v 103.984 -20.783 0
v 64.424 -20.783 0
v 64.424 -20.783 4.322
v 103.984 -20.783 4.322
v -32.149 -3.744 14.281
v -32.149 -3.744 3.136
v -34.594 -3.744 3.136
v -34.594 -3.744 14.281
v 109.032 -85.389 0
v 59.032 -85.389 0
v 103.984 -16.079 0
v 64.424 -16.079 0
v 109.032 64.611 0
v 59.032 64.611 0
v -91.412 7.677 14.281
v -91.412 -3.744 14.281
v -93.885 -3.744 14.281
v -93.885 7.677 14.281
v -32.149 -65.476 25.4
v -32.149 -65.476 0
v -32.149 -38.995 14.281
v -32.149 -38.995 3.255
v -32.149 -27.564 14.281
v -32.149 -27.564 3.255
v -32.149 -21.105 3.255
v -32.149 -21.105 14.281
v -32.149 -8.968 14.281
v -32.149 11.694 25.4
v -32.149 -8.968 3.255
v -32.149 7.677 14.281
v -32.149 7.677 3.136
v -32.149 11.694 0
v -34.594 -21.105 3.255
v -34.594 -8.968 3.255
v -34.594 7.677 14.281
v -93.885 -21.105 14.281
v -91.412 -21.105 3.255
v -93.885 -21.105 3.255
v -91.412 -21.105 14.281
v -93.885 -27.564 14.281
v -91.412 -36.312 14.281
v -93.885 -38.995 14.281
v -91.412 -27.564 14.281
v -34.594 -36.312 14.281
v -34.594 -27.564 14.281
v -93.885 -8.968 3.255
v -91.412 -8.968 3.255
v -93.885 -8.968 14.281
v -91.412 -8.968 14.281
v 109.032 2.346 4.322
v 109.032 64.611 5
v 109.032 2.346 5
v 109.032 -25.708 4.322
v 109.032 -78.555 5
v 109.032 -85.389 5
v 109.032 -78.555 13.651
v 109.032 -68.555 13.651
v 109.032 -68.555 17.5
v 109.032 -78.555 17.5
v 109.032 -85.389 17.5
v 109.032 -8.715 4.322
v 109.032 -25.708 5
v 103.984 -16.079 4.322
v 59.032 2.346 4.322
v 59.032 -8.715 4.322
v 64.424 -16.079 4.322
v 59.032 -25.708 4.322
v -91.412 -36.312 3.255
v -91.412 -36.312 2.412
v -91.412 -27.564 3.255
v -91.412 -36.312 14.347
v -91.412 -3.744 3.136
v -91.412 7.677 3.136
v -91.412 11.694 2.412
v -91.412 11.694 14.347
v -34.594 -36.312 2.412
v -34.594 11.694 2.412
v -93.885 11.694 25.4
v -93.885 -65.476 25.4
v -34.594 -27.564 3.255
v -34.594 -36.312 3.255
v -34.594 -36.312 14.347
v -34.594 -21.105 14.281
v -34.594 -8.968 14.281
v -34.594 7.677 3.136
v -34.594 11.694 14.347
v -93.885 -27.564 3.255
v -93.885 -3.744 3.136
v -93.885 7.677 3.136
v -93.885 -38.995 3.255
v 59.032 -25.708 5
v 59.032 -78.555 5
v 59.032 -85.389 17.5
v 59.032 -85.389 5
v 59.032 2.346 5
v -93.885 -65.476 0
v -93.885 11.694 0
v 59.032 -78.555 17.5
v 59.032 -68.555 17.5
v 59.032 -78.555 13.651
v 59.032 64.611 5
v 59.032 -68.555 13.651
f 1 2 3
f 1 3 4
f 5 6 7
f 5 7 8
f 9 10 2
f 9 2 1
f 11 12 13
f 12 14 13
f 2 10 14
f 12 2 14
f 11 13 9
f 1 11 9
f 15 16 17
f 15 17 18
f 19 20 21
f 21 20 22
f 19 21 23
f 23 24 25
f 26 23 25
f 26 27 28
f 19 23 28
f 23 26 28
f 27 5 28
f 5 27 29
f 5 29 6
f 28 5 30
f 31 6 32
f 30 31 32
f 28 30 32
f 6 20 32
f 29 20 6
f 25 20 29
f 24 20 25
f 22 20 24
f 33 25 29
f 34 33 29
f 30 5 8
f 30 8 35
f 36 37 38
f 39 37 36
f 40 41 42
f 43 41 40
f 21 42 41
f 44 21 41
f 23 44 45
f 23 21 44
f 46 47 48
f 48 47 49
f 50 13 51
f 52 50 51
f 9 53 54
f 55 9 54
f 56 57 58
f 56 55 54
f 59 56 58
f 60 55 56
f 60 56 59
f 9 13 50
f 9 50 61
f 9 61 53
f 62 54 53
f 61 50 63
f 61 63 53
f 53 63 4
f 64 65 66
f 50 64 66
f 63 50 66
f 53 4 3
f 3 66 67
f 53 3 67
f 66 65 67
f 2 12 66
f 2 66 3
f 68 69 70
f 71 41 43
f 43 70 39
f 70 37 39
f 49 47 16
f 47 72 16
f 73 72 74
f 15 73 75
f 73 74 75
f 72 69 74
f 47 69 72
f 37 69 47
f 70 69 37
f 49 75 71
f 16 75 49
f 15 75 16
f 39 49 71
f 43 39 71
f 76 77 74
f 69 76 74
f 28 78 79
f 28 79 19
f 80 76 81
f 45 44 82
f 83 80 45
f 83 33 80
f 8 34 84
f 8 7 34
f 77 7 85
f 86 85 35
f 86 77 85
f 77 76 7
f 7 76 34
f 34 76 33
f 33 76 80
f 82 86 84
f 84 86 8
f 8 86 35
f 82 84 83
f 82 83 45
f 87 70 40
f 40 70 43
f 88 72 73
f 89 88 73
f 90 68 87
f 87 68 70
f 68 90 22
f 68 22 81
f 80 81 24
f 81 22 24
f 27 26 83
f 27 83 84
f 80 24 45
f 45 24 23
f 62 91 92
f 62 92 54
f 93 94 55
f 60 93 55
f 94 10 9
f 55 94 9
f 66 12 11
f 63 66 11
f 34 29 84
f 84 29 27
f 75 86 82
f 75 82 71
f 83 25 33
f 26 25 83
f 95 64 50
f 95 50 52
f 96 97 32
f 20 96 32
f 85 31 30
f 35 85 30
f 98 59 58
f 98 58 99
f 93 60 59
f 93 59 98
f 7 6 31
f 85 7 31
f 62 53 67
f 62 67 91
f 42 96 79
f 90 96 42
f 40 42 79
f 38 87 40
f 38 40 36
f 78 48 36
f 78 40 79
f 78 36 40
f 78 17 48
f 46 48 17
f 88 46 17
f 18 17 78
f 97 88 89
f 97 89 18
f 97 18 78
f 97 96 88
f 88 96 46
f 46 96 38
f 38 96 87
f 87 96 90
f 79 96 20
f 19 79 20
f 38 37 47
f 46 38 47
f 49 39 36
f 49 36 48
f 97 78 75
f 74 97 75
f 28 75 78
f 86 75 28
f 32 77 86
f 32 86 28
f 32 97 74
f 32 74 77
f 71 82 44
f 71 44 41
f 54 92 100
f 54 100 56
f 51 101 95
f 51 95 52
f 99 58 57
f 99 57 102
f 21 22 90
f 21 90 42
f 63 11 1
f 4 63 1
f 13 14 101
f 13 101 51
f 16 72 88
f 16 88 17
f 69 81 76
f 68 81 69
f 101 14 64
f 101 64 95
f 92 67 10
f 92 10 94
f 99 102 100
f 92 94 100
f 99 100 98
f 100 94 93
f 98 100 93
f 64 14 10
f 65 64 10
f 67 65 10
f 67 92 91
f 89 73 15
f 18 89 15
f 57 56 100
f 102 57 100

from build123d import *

# Parameters (mm, degrees)
F0_W      = 50
F0_H      = 150
F1_DEPTH  = 5
F2_W      = 16.9925941154
F2_H      = 5.7588387281
F3_DEPTH  = 56.642
F4_W      = 16.9925941154
F4_H      = 0.678097941
F4_W_2    = 11.0609598923
F5_DEPTH  = 60.96
F6_W      = 39.5601838827
F6_H      = 4.704285413
F7_DEPTH  = 25.4
F8_W      = 50
F8_H      = 6.8344867335
F9_DEPTH  = 12.5
F10_W     = 50
F10_H     = 3.8493825495
F11_DEPTH = 10
F12_W     = 61.7356710136
F12_H     = 77.1696018055
F13_DEPTH = 25.4
F14_W     = 56.8176433444
F14_H     = 11.9355437346
F15_DEPTH = 48.006
F16_W     = 11.4312767982
F16_H     = 11.0261759255
F16_W_2   = 11.4204857964
F16_H_2   = 11.145521421
F16_W_3   = 12.1373645961
F17_DEPTH = 64.008


with BuildPart() as f1:
    # F0 (on Top) → F1 (new body)
    with BuildSketch(Plane.XY):
        with Locations((84.032246843, -10.3894895421)):
            Rectangle(F0_W, F0_H)
    extrude(amount=F1_DEPTH)

    # F2 (on face) → F3 (cut)
    with BuildSketch(Plane.YZ.offset(109.032246843)):
        with Locations((-17.2116872855, 7.2013214231)):
            Rectangle(F2_W, F2_H)
    extrude(amount=-F3_DEPTH, mode=Mode.SUBTRACT)

    # F4 (on face) → F5 (cut)
    with BuildSketch(Plane(origin=(59.032246843, 0, 0), x_dir=(0, -1, 0), z_dir=(-1, 0, 0))):
        with Locations((17.2116872855, 4.6609510295)):
            Rectangle(F4_W, F4_H)
        with Locations((3.1849102816, 4.6609510295)):
            Rectangle(F4_W_2, F4_H)
    extrude(amount=-F5_DEPTH, mode=Mode.SUBTRACT)

    # F6 (on face) → F7 (cut)
    with BuildSketch(Plane(origin=(0, 0, 0), x_dir=(1, 0, 0), z_dir=(0, 0, -1))):
        with Locations((84.2039734125, 18.431045115)):
            Rectangle(F6_W, F6_H)
    extrude(amount=-F7_DEPTH, mode=Mode.SUBTRACT)

    # F8 (on face) → F9 (join)
    with BuildSketch(Plane.XY.offset(5)):
        with Locations((84.032246843, -81.9722461753)):
            Rectangle(F8_W, F8_H)
    extrude(amount=F9_DEPTH)

    # F10 (on face) → F11 (join)
    with BuildSketch(Plane(origin=(0, -78.5550028086, 0), x_dir=(-1, 0, 0), z_dir=(0, 1, 0))):
        with Locations((-84.032246843, 15.5753087252)):
            Rectangle(F10_W, F10_H)
    extrude(amount=F11_DEPTH)


with BuildPart() as f13:
    # F12 (on Top) → F13 (new body)
    with BuildSketch(Plane.XY):
        with Locations((-63.0170051008, -26.8910801969)):
            Rectangle(F12_W, F12_H)
    extrude(amount=F13_DEPTH)

    # F14 (on face) → F15 (cut)
    with BuildSketch(Plane(origin=(0, 11.6937207058, 0), x_dir=(-1, 0, 0), z_dir=(0, 1, 0))):
        with Locations((63.0026869476, 8.379339939)):
            Rectangle(F14_W, F14_H)
    extrude(amount=-F15_DEPTH, mode=Mode.SUBTRACT)

    # F16 (on face) → F17 (cut)
    with BuildSketch(Plane.YZ.offset(-32.149169594)):
        with Locations((-33.2797728479, 8.7681905134)):
            Rectangle(F16_W, F16_H)
        with Locations((1.9663505955, 8.7085177656)):
            Rectangle(F16_W_2, F16_H_2)
        with Locations((-15.0362700224, 8.7681905134)):
            Rectangle(F16_W_3, F16_H)
    extrude(amount=-F17_DEPTH, mode=Mode.SUBTRACT)


solid = Compound([f1.part, f13.part])
